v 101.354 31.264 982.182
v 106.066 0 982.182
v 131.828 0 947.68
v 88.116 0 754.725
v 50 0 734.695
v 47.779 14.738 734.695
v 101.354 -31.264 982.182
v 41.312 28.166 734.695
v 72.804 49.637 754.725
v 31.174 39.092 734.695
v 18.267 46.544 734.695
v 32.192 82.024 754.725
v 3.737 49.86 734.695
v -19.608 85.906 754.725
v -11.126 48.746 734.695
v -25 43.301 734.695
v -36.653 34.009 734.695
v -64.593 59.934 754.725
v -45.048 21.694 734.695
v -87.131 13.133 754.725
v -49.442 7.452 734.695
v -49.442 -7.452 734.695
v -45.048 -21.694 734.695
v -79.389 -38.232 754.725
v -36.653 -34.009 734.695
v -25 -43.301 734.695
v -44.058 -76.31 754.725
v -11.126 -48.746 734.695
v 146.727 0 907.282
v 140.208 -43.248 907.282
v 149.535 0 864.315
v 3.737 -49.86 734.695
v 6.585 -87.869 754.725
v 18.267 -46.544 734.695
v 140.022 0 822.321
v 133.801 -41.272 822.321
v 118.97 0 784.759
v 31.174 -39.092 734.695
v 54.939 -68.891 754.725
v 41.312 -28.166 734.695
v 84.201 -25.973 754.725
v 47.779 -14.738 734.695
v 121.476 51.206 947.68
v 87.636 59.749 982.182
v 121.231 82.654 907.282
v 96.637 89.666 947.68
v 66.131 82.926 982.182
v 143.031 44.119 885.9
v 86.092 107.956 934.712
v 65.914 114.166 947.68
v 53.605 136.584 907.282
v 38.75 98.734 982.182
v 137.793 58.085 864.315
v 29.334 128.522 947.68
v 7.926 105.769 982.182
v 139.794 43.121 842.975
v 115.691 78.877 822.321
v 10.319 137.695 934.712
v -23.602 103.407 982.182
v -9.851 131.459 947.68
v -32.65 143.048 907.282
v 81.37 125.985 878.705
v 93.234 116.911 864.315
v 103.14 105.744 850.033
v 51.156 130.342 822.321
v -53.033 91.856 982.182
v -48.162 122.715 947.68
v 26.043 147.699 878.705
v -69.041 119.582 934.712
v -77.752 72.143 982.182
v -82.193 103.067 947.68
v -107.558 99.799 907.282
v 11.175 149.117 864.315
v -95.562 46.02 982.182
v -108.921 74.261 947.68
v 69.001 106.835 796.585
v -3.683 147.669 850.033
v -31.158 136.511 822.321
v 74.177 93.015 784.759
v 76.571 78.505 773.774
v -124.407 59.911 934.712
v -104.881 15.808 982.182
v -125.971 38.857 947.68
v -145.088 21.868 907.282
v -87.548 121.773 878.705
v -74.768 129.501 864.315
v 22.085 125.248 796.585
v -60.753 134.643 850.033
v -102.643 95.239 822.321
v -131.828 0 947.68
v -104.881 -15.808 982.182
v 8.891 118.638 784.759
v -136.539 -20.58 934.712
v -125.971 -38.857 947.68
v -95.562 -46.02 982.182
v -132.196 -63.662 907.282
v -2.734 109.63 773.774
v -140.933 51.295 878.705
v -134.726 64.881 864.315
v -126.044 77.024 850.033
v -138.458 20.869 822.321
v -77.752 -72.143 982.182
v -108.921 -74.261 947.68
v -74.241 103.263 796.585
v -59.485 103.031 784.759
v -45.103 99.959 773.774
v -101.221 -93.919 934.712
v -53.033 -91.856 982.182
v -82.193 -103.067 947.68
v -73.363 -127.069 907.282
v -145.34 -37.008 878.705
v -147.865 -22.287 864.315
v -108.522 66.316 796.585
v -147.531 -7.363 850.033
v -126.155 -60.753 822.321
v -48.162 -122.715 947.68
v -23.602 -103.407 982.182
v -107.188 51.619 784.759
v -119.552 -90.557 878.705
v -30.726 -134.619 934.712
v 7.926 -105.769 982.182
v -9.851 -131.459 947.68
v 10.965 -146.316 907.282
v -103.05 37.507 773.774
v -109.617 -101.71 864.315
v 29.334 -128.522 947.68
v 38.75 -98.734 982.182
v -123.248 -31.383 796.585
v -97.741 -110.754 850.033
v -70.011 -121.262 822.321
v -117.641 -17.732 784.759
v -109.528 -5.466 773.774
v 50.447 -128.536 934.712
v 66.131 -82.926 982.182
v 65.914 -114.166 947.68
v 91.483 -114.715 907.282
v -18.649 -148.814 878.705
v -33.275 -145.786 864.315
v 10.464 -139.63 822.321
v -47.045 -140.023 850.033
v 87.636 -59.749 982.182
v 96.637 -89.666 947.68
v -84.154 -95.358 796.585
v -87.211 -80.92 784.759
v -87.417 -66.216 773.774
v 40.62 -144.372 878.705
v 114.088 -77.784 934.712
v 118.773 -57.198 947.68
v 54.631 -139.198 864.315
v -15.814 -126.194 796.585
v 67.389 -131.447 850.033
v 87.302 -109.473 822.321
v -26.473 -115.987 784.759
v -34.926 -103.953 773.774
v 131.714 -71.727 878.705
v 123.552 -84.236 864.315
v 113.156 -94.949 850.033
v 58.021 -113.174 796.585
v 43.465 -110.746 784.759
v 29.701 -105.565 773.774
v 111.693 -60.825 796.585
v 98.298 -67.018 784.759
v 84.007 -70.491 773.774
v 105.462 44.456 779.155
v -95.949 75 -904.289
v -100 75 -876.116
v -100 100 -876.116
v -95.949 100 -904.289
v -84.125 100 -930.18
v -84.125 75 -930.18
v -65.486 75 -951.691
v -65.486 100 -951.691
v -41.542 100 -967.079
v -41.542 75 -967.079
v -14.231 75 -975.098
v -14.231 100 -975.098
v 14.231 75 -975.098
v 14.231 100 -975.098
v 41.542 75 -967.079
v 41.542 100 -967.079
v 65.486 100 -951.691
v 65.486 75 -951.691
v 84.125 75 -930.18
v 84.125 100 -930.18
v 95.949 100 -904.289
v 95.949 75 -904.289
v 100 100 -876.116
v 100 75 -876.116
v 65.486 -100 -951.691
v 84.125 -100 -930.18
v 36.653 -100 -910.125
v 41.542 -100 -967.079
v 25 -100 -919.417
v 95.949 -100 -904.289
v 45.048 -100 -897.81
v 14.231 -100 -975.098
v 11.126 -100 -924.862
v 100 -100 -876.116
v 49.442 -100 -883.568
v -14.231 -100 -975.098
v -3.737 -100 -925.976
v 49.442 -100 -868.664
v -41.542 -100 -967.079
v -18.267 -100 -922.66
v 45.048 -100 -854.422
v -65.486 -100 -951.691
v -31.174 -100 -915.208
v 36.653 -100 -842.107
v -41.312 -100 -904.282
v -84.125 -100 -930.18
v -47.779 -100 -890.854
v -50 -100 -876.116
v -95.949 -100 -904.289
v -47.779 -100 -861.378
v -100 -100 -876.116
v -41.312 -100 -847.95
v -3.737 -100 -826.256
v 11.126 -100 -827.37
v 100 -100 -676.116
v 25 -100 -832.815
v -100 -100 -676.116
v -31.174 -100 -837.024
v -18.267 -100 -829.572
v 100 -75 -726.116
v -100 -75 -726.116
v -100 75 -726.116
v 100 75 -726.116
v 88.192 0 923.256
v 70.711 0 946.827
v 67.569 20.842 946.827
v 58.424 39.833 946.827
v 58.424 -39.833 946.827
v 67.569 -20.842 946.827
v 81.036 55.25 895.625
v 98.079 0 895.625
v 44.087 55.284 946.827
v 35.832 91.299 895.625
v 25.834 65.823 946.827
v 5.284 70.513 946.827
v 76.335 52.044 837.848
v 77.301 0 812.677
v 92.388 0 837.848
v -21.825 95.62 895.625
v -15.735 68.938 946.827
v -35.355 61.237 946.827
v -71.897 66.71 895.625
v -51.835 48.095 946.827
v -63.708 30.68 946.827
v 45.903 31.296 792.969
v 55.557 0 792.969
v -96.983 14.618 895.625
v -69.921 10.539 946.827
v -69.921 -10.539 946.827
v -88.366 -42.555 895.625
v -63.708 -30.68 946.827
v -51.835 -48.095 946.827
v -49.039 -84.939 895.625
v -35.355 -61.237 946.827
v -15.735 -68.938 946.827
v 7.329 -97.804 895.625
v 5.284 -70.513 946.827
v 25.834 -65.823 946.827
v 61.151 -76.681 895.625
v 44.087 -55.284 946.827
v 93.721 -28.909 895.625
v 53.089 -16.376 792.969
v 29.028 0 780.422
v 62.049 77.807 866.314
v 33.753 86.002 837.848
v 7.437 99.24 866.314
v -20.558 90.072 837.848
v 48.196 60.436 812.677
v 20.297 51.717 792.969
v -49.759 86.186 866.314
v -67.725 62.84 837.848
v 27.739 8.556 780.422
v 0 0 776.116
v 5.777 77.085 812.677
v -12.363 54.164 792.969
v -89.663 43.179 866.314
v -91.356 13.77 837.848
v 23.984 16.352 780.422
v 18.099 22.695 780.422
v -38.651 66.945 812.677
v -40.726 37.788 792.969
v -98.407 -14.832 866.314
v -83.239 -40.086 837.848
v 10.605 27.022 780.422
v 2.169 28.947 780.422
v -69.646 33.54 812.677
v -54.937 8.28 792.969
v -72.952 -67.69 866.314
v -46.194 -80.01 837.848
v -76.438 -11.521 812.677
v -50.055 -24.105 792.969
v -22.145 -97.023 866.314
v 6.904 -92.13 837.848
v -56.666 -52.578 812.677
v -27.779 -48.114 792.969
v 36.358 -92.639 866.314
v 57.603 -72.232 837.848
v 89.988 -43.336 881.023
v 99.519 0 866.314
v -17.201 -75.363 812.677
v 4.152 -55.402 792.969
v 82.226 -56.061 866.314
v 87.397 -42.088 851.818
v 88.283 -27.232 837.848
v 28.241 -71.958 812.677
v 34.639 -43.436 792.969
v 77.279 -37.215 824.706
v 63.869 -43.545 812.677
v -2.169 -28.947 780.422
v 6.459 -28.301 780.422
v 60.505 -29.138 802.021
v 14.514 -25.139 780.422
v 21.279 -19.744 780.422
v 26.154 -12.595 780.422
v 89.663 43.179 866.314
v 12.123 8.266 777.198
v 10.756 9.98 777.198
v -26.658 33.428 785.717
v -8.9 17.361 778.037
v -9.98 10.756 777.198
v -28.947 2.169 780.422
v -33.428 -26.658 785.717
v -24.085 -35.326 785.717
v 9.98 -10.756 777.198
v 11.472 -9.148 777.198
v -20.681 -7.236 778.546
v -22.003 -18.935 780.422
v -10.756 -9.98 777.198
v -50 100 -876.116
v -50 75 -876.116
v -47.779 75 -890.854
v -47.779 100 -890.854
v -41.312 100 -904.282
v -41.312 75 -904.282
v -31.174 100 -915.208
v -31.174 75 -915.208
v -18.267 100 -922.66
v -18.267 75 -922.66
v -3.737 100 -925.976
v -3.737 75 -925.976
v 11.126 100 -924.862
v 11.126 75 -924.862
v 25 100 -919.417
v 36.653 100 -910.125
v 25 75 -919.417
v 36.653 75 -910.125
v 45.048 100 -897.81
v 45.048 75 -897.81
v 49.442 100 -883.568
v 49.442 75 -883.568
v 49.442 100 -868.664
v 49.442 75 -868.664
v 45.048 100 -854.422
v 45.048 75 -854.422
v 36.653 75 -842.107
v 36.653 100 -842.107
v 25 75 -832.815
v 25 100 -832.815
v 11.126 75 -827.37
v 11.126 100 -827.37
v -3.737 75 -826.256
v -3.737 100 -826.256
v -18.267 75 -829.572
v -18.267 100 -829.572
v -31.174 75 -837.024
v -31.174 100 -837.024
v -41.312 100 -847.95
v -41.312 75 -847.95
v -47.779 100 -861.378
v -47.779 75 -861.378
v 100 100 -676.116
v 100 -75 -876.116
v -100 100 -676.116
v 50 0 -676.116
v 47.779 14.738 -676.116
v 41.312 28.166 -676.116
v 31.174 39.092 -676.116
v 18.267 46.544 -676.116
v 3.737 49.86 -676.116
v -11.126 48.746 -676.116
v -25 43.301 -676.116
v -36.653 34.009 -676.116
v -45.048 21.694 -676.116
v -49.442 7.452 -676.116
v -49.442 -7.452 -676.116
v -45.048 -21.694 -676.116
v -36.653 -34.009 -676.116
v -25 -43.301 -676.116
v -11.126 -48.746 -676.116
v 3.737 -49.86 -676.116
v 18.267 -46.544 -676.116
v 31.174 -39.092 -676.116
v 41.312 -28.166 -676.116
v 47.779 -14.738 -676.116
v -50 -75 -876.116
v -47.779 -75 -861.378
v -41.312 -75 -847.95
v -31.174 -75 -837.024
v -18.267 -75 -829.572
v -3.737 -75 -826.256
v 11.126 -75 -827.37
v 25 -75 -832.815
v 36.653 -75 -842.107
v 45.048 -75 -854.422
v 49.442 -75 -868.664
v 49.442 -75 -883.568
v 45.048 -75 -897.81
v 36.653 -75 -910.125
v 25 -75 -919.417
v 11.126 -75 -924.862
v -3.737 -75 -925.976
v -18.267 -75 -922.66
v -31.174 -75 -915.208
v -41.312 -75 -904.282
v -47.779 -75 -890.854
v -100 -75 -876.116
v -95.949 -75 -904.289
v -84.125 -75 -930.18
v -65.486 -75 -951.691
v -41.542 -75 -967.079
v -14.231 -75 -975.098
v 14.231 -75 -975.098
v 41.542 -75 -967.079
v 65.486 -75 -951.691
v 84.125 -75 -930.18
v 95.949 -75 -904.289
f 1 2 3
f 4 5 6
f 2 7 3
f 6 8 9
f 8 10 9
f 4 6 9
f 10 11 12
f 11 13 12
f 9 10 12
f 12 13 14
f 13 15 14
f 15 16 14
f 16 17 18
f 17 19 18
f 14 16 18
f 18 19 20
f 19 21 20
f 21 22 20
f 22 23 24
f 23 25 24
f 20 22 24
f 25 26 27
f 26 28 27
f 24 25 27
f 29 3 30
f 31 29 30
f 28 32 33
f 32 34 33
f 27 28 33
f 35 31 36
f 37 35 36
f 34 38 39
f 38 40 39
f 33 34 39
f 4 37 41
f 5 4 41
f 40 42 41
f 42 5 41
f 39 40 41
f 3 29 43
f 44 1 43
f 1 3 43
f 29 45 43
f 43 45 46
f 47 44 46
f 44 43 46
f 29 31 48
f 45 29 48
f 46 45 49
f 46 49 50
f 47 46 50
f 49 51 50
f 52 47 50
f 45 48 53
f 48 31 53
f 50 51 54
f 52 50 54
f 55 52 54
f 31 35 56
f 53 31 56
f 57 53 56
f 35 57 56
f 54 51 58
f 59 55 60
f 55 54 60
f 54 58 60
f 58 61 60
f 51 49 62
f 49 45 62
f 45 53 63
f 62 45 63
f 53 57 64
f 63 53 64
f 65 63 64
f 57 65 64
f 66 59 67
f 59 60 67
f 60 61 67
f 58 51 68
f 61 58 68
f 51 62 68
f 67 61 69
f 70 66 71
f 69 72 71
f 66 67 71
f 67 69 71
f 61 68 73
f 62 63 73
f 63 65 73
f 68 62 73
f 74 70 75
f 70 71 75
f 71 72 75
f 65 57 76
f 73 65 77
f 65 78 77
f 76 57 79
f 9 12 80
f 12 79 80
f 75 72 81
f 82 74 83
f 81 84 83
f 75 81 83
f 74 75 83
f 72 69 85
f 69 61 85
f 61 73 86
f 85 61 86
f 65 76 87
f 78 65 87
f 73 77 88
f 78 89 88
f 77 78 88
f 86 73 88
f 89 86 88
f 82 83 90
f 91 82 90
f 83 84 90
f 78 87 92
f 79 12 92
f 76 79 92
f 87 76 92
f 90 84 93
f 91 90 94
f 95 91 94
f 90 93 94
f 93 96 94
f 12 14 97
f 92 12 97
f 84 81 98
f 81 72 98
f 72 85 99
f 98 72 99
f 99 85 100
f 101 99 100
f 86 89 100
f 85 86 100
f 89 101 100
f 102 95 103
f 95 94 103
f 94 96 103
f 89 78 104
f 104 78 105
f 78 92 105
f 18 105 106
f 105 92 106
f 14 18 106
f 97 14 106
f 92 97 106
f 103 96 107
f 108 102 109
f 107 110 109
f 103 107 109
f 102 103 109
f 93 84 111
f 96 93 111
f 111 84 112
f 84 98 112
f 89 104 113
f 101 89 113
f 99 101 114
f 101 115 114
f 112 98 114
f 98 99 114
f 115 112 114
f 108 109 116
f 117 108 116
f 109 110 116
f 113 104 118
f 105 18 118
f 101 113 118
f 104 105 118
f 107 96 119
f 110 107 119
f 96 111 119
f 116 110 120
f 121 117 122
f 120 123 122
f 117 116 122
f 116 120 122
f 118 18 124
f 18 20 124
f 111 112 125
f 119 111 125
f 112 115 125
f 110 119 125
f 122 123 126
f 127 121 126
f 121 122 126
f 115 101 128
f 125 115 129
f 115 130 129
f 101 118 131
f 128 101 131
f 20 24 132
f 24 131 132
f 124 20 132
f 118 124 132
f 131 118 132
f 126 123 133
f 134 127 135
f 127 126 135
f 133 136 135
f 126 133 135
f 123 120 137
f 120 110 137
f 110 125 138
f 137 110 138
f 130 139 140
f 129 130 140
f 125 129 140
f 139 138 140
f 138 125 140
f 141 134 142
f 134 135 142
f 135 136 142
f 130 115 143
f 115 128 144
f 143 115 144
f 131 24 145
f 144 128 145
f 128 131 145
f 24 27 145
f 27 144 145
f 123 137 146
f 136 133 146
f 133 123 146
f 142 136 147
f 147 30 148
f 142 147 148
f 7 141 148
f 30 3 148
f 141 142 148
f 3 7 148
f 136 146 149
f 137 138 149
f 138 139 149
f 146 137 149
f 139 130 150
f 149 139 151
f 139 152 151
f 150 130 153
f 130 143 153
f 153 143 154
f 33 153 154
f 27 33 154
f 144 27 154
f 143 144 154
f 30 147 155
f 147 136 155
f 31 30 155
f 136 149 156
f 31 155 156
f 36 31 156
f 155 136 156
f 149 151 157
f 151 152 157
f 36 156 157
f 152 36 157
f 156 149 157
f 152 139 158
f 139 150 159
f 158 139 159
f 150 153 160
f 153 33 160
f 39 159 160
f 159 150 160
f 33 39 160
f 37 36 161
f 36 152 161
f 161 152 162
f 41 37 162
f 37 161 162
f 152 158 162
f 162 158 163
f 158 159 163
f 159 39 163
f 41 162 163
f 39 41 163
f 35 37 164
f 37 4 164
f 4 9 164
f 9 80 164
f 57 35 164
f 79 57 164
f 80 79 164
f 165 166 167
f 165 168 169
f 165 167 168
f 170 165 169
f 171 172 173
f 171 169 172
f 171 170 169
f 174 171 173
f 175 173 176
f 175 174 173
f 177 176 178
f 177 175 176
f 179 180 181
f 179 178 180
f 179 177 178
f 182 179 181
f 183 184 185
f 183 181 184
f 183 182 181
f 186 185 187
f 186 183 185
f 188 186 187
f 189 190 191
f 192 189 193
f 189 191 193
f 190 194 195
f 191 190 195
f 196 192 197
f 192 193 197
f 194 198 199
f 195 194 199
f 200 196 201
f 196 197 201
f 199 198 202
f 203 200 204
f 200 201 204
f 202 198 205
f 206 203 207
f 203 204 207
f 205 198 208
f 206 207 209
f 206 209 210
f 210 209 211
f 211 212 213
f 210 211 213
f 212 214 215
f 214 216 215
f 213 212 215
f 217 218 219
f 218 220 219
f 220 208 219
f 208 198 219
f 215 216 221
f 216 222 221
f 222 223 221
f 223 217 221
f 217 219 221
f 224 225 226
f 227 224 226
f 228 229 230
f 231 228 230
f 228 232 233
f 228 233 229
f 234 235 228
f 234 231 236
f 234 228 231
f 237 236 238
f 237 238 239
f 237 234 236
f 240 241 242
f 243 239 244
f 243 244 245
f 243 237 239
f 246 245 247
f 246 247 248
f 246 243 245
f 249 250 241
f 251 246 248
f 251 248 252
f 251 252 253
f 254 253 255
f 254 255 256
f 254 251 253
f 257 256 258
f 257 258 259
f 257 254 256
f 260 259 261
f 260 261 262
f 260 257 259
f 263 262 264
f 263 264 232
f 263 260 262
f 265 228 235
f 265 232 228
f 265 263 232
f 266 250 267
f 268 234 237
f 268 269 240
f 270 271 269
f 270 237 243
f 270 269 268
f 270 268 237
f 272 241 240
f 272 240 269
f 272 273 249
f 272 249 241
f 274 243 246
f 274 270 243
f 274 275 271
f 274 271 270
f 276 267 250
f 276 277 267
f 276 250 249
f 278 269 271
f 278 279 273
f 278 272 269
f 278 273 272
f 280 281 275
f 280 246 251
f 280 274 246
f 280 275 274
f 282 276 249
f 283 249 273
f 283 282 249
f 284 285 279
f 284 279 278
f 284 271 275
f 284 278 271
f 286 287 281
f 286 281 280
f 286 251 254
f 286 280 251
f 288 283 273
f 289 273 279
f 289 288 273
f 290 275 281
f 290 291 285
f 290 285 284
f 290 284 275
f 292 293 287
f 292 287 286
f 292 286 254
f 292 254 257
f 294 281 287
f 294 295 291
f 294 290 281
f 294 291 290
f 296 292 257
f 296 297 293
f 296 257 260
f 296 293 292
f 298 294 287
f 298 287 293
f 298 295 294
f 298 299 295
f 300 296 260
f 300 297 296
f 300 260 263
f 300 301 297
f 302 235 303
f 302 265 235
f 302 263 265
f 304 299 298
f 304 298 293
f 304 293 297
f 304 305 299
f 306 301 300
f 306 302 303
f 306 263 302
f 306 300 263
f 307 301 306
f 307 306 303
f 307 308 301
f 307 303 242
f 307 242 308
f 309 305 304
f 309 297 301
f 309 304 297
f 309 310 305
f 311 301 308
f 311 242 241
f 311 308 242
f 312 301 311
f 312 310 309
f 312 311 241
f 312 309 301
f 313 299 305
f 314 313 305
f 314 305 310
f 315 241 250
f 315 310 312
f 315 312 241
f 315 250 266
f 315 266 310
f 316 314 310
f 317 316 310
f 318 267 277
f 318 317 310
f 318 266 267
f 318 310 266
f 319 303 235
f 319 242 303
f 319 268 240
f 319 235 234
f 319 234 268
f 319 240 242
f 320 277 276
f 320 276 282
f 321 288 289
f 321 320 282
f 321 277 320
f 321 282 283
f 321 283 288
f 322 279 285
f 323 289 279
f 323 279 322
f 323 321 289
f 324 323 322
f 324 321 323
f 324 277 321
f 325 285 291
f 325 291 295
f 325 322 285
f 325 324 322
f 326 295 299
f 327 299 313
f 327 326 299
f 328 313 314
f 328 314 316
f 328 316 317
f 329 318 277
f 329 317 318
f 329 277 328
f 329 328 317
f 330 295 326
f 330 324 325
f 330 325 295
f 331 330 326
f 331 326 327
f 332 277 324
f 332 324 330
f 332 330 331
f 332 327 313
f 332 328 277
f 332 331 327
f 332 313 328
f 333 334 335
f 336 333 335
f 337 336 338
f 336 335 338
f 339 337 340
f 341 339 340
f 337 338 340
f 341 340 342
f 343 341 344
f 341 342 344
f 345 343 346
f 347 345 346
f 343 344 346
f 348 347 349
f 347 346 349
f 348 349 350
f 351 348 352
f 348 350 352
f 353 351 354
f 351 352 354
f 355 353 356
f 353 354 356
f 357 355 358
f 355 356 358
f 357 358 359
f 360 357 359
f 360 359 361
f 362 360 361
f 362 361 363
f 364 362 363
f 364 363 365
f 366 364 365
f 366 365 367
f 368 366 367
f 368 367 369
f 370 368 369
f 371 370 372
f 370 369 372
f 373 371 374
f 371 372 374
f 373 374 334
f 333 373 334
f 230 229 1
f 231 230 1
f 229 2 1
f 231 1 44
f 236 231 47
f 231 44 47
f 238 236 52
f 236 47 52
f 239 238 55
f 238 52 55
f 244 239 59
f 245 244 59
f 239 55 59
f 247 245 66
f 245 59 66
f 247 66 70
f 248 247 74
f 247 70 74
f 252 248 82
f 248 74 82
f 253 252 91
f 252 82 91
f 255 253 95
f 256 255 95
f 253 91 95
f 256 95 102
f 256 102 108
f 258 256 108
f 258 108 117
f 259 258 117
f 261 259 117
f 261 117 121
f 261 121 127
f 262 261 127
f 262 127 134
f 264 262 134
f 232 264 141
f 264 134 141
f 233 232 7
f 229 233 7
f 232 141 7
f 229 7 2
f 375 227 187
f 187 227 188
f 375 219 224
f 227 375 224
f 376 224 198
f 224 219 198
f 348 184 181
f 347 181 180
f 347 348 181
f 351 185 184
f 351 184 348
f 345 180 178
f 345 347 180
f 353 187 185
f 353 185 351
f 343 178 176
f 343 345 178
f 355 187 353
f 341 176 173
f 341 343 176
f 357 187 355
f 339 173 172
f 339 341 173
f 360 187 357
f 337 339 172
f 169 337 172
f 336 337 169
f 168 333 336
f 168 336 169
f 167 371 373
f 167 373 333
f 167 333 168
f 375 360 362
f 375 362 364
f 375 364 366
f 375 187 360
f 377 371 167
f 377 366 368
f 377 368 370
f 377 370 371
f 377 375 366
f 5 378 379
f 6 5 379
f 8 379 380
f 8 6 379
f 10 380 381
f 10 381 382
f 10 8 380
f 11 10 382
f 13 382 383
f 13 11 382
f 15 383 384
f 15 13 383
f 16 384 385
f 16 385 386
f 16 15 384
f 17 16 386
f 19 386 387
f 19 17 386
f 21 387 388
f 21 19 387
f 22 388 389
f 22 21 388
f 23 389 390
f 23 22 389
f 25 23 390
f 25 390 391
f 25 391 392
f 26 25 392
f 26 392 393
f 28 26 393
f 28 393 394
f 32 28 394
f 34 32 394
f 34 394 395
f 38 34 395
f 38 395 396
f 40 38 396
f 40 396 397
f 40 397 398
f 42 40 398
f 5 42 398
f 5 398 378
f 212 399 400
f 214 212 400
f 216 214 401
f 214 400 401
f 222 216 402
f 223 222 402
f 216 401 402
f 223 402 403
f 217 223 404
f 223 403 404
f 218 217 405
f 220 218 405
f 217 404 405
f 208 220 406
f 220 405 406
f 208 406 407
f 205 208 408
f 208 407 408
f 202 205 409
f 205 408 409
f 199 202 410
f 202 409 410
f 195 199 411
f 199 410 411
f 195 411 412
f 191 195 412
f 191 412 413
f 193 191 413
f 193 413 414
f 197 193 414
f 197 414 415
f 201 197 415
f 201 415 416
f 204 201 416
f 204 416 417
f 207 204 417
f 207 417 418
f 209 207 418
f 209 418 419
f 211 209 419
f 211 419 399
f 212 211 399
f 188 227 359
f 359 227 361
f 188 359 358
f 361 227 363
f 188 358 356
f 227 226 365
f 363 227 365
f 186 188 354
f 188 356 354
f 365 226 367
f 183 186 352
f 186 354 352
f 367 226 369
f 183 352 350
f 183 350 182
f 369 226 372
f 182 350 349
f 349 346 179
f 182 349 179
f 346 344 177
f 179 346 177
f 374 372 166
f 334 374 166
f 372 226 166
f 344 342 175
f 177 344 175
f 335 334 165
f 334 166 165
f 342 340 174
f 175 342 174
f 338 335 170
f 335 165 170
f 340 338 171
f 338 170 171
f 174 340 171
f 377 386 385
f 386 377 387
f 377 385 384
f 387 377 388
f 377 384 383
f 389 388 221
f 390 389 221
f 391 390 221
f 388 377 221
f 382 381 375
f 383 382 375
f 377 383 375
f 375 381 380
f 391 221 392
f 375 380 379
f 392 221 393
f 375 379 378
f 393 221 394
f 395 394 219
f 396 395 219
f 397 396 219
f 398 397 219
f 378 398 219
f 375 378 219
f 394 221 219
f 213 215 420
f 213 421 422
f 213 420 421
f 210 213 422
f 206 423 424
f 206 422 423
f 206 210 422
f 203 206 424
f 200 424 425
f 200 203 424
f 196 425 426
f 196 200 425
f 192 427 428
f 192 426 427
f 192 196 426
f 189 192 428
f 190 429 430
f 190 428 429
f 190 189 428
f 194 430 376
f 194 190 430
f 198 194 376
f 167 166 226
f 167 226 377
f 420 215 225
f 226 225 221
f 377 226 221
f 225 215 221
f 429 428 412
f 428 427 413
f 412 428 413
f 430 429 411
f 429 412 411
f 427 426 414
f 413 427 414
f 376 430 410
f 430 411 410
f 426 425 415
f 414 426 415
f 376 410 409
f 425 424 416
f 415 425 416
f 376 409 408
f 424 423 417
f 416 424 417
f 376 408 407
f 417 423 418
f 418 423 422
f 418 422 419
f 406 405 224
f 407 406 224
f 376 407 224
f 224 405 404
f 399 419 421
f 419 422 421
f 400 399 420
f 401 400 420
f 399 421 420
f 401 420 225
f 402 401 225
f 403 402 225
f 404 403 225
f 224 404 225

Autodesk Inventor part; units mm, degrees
ref_plane "YZ Plane" through (0, 0, 0) normal (1, 0, 0) x (0, 1, 0)
ref_plane "XZ Plane" through (0, 0, 0) normal (0, 1, 0) x (-1, 0, 0)
ref_plane "XY Plane" through (0, 0, 0) normal (0, 0, 1) x (1, 0, 0)
sketch "Sketch1" plane through (0, 0, 0) normal (0, 1, 0) x (-1, 0, 0)
  line L0 (0, 0) -> (0, -776.116)
  line L1 (-50, -734.6946) -> (-50, 0)
  line L2 (0, 0) -> (-173.6931, 0)
  line L3 (0, 0) -> (0, 776.116)
  line L4 (-50, 734.6946) -> (-50, 0)
  arc A0 (-106.066, 982.182) -> (-50, 734.6946) centre (0, 876.116) ccw
  arc A1 (-70.7107, 946.8267) -> (0, 776.116) centre (0, 876.116) ccw
  line L5 (-70.7107, 946.8267) -> (-106.066, 982.182)
  line L6 (0, -1268.9888) -> (0, 1481.1208) construction
  line L7 (0, -776.116) -> (0, -876.116)
  line L8 (0, -876.116) -> (-50, -876.116)
  line L9 (-50, -876.116) -> (-50, -734.6946)
  point P0 (0, -2.2081)
  point P1 (-13.1062, 0)
  point P2 (-20, -18.7767)
  point P3 (-20, 3.1509)
  point P4 (-46.6023, 0)
  point P5 (-20, -18.7767)
  dimension "d6" = 45
  dimension "d7" = 50
  dimension "d8" = 100
  dimension "d9" = 50
  dimension "d10" = 1752.232
revolve "Revolution1" add sketch "Sketch1" angle 360 about axis through (0, 0, -10) along (0, 0, 1)
sketch "Sketch2" plane through (0, 0, 0) normal (0, 1, 0) x (-1, 0, 0)
  line L0 (50, -876.116) -> (-50, -876.116) projected
  arc A0 (-100, -876.116) -> (100, -876.116) centre (0, -876.116) ccw
  line L1 (65.0556, -876.116) -> (-85.3956, -876.116)
  line L2 (0, -338.7665) -> (0, -580.5318)
  line L3 (100, -876.116) -> (100, -676.116)
  line L4 (100, -676.116) -> (-100, -676.116)
  line L5 (-100, -676.116) -> (-100, -876.116)
  point P0 (0, 0)
  dimension "d11" = 100
  dimension "d12" = 200
extrude "Extrusion1" add sketch "Sketch2" along normal mid plane 200
sketch "Sketch4" plane through (0, 0, 0) normal (0, 1, 0) x (-1, 0, 0)
  arc A0 (-100, -876.116) -> (100, -876.116) centre (0, -876.116) ccw construction
  circle A1 centre (0, -876.116) radius 50
  point P0 (0, 0)
  dimension "d16" = 50
extrude "Extrusion2" cut sketch "Sketch4" along normal through all both and the other way through all
sketch "Sketch6" plane through (0, 0, 0) normal (1, 0, 0) x (0, 1, 0)
  line L0 (-100, -976.116) -> (100, -976.116) construction
  line L1 (0, -623.7458) -> (0, -465.1617)
  line L2 (75, -976.116) -> (-75, -976.116)
  line L3 (-75, -976.116) -> (-75, -726.116)
  line L4 (-75, -726.116) -> (75, -726.116)
  line L5 (75, -726.116) -> (75, -976.116)
  point P0 (0, 0)
  point P1 (0, -976.116)
  dimension "d27" = 150
  dimension "d28" = 250
extrude "Extrusion4" cut sketch "Sketch6" along normal through all both and the other way through all
equation "\"d7\" = rod_radius"
equation "\"d8\" = S_radius"
equation "\"d9\" = rod_radius"
equation "\"d10\" = L1"
equation "\"d11\" = S_radius"
equation "\"d12\" = 2 * S_radius"
equation "\"d13\" = 2 * S_radius"
equation "\"d16\" = rod_radius"
equation "\"d27\" = 3 * rod_radius"
equation "\"d28\" = 5 * rod_radius"
equation "\"L1\" = 1752.23201"
equation "\"rod_radius\" = 50"
equation "\"S_radius\" = 2 * rod_radius"
equation "\"dyad1_Fx\" = -4260.66351"
equation "\"dyad1_Fy\" = 914.69194"
equation "\"dyad1_Fz\" = 2675.35545"
equation "\"dyad2_Fx\" = -451.87793"
equation "\"dyad2_Fy\" = -915.49296"
equation "\"dyad2_Fz\" = 3417.84038"
equation "\"dyad3_Fx\" = -4318"
equation "\"dyad3_Fz\" = 1248"
equation "\"dyad4_Fx\" = 2692.78997"
equation "\"dyad4_Fy\" = 2100.31348"
equation "\"dyad4_Fz\" = 2764.89028"
equation "\"dyad5_Fx\" = 3055.55556"
equation "\"dyad5_Fy\" = -2032.16374"
equation "\"dyad5_Fz\" = 2423.97661"
equation "\"L2\" = 1260.47471"
equation "\"L3\" = 1299.40028"
equation "\"L4\" = 3944.54642"
equation "\"L5\" = 2129.93938"
properties part number "US_Dyad-01"
